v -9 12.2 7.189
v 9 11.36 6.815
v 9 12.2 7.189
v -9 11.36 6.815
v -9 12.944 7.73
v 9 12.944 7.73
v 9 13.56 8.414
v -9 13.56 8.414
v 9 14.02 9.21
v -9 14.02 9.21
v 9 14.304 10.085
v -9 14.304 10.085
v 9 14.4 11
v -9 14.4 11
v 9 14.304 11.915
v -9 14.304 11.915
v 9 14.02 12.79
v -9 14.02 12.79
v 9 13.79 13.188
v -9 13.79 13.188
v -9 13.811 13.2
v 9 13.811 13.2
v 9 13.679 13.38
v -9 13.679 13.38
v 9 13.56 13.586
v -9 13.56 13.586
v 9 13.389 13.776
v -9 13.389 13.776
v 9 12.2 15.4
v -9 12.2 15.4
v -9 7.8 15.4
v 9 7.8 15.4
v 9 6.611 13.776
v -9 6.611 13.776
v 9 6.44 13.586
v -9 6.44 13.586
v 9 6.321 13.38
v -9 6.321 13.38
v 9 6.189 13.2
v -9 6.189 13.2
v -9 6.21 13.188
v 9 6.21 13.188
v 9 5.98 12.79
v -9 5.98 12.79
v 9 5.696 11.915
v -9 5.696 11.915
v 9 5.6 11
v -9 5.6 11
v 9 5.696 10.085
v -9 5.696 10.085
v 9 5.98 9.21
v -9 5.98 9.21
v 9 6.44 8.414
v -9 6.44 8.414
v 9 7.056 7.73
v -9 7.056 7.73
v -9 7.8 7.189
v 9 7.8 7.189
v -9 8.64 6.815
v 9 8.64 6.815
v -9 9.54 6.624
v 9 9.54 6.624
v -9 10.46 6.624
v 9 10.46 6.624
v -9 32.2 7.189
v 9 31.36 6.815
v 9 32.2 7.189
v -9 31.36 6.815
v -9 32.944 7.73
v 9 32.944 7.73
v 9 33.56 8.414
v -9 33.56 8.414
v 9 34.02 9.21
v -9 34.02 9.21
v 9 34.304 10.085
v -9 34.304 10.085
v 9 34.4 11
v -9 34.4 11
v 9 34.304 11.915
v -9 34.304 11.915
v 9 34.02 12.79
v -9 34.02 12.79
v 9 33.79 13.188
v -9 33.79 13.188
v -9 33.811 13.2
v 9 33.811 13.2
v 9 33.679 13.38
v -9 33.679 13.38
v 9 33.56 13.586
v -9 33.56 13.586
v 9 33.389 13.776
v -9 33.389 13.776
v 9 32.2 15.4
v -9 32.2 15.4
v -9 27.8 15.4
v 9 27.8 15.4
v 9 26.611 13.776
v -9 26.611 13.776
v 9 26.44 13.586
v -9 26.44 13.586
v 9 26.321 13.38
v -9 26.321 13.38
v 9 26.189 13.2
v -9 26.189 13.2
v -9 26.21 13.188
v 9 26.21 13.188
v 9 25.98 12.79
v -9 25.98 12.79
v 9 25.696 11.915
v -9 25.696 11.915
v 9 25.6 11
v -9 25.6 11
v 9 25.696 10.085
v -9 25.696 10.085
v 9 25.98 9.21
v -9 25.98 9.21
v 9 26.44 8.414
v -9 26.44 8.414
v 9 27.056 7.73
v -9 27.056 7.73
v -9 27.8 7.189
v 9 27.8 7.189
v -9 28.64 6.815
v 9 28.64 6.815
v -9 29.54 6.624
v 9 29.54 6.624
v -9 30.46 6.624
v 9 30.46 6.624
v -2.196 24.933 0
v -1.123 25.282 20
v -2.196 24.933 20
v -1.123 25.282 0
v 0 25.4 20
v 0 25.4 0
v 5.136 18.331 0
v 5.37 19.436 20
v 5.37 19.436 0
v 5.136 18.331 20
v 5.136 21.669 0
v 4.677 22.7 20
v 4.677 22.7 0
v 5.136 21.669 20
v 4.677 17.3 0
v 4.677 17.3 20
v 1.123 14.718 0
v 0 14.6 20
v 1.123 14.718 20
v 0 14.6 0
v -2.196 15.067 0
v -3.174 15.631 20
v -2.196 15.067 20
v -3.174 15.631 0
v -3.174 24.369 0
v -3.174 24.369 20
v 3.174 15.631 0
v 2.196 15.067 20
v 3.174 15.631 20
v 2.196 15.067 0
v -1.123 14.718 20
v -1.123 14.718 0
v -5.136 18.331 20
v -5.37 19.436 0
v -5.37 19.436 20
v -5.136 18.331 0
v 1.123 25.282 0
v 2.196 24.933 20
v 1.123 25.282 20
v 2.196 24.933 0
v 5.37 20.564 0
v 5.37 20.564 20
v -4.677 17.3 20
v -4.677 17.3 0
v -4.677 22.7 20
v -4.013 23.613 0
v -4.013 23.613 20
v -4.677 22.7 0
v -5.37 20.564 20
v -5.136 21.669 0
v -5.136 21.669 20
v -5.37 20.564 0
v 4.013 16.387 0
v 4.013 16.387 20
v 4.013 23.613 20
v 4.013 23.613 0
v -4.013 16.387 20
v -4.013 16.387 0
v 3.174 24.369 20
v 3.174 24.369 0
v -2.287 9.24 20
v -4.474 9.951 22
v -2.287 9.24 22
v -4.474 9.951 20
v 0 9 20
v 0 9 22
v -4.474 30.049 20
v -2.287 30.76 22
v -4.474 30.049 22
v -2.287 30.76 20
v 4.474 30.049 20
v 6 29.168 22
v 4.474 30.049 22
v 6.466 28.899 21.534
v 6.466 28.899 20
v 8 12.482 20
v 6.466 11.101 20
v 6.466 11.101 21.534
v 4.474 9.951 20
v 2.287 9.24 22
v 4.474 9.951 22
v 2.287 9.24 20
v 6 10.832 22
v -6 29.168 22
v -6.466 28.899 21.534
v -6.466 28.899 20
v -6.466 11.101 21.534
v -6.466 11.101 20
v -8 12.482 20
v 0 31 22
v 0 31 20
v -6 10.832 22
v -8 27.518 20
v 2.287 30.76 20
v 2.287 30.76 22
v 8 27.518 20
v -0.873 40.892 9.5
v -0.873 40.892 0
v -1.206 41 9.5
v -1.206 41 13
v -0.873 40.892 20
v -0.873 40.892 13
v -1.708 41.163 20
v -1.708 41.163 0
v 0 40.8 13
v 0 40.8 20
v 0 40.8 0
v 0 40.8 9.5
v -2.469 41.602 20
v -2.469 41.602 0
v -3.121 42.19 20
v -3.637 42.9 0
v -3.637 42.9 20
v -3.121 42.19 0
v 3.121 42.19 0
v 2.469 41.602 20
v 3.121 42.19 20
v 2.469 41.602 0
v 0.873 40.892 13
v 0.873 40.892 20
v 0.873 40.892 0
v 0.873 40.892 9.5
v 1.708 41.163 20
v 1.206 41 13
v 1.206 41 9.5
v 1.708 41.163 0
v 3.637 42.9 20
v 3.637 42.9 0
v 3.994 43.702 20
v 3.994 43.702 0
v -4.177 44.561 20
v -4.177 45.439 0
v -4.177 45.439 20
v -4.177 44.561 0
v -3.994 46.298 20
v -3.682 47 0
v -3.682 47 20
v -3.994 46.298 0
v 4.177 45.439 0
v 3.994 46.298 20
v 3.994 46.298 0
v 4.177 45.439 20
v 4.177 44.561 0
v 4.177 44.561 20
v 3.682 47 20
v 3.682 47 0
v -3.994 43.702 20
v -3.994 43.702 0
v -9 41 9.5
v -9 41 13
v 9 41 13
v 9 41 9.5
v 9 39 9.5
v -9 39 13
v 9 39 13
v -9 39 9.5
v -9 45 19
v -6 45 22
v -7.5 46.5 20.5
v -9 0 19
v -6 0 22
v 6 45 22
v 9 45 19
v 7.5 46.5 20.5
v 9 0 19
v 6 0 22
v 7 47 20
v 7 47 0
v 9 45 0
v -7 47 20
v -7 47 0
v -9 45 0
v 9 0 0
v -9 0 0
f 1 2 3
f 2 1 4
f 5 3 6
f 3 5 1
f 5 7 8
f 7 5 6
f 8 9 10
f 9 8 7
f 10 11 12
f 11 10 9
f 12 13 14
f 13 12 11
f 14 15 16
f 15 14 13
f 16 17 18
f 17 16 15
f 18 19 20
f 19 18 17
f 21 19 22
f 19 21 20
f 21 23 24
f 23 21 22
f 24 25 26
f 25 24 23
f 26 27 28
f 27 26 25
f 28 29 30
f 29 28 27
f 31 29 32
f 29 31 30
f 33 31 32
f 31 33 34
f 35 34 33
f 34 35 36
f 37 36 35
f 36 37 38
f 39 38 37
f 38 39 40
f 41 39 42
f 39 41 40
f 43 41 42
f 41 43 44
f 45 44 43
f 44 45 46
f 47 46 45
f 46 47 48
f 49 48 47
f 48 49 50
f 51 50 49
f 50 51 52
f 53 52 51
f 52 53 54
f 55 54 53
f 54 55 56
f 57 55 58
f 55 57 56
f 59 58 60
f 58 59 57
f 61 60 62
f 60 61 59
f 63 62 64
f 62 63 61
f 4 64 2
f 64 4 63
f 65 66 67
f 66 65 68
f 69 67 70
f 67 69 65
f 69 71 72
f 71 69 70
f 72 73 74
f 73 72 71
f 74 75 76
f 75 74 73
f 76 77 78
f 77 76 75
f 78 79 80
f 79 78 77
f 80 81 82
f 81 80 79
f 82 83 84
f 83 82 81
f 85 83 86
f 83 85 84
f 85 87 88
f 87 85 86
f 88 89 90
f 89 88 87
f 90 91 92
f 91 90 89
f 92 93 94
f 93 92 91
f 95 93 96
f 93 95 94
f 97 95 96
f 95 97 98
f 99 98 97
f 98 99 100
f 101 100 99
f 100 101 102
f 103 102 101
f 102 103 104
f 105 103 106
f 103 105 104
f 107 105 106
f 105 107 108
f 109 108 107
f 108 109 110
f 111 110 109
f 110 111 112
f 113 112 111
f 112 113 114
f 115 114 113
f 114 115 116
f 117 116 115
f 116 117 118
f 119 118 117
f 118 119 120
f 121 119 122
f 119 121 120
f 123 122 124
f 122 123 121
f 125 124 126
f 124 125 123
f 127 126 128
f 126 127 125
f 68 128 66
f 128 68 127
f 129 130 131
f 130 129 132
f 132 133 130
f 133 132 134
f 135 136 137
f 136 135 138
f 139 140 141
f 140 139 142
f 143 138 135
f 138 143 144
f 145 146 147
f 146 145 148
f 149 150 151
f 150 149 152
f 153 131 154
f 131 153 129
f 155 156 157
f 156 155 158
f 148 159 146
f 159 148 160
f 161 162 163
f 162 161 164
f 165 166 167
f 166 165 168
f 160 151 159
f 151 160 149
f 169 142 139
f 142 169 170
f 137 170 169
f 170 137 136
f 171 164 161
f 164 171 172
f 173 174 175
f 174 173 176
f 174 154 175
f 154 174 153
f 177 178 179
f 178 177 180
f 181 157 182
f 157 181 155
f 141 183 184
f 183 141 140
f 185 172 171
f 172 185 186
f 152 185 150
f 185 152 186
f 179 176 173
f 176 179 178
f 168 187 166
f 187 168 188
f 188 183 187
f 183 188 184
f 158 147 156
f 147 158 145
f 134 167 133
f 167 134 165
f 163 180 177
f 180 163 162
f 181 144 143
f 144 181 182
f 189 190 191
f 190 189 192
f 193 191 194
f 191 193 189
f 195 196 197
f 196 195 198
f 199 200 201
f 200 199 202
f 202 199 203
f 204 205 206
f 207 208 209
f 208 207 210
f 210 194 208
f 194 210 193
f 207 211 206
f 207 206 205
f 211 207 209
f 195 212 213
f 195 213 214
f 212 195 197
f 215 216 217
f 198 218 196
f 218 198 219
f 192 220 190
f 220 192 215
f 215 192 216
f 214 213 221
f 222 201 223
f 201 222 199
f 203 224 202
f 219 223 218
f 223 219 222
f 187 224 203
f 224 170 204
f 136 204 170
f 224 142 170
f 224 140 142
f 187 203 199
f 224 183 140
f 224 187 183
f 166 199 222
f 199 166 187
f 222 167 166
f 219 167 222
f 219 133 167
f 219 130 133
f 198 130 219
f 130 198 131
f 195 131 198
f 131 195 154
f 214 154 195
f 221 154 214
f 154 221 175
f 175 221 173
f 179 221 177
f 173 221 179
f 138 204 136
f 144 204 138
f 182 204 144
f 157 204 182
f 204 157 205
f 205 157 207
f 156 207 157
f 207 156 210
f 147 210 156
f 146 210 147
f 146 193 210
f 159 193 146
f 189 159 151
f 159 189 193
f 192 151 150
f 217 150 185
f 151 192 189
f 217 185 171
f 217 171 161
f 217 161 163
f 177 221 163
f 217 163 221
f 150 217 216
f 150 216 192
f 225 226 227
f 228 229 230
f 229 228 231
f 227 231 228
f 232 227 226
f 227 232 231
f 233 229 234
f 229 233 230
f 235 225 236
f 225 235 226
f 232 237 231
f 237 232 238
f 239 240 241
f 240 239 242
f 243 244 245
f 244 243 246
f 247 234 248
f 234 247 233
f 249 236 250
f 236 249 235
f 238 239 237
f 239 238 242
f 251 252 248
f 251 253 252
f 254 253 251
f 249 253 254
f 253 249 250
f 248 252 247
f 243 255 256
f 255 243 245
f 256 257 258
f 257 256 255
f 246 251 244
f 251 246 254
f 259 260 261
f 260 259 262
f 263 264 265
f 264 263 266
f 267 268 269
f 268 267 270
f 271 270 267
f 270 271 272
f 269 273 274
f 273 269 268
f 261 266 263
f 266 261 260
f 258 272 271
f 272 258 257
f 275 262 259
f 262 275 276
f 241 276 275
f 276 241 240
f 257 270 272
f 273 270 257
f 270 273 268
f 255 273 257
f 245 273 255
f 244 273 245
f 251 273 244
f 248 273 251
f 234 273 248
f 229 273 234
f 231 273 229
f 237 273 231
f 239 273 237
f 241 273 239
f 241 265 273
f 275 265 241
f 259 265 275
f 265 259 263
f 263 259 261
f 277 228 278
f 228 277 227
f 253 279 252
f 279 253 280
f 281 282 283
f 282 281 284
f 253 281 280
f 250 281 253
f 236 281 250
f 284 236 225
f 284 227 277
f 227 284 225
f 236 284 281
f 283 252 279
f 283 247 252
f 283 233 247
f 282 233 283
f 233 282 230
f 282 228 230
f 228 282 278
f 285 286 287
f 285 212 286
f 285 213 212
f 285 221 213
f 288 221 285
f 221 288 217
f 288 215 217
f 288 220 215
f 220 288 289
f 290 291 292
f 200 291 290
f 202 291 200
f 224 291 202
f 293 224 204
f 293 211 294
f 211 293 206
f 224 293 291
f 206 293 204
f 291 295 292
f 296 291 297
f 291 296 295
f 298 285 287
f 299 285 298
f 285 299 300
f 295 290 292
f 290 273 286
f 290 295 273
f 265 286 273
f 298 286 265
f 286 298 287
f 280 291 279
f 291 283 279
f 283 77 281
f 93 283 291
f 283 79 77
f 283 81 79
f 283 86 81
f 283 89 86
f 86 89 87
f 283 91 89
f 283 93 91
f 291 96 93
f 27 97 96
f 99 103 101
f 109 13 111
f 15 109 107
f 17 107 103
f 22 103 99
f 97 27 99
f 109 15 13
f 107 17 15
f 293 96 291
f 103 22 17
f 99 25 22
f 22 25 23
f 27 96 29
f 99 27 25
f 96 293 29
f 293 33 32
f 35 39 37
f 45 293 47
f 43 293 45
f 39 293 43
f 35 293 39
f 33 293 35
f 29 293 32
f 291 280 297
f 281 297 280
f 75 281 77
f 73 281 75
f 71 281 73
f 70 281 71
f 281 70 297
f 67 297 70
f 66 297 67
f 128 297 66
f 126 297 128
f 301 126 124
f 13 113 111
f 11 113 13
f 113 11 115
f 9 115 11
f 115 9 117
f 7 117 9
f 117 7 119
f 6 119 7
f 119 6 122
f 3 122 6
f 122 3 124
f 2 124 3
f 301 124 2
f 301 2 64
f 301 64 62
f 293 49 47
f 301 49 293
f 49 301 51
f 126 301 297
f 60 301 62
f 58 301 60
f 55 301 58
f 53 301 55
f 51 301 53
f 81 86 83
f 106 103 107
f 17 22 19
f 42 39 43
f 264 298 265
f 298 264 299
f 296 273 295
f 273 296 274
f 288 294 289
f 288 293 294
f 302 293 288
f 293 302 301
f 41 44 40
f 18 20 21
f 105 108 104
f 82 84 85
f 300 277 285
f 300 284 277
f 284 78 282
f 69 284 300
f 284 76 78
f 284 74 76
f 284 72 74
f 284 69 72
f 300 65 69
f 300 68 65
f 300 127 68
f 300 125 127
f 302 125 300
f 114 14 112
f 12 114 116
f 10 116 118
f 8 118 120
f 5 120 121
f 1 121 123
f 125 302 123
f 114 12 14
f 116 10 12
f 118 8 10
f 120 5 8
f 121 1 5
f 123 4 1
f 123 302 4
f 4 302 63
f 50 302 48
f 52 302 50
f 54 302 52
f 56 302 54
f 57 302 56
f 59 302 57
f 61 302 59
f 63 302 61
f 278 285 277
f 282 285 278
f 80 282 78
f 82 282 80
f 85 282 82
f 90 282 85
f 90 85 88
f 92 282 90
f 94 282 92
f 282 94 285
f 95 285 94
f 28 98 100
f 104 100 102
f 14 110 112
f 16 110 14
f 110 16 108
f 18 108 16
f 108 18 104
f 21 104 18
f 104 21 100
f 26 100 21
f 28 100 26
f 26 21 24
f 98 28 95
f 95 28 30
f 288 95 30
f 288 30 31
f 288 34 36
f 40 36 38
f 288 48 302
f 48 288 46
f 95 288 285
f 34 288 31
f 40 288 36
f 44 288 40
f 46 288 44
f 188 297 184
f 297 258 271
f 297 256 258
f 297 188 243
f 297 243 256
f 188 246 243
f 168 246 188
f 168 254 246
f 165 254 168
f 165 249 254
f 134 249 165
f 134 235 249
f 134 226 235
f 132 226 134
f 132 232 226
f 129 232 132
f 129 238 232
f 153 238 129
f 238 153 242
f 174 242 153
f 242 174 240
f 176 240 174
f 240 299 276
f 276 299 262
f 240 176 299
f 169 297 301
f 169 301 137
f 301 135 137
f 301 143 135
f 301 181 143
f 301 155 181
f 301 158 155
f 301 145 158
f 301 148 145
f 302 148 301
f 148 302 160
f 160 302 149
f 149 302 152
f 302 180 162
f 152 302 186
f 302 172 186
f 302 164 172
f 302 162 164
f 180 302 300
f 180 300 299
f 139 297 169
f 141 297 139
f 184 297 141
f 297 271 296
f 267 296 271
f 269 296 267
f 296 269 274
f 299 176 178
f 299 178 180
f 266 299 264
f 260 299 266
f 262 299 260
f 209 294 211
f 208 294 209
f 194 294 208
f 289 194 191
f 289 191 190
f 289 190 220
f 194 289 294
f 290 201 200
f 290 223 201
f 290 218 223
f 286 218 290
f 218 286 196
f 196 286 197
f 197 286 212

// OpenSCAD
// PRUSA iteration3
// Y frame corners
// GNU GPL v3
// Josef Průša <iam@josefprusa.cz> and contributors
// http://www.reprap.org/wiki/Prusa_Mendel
// http://prusamendel.org


module corner_base(){	
 translate([-9,-11,0])cube([18,22,47]);
}

module corner_holes(){
 translate([-11,-11,0]){
  // Bottom hole
translate([1,11,10]) rotate([90,0,0]) teardrop(r=4.4,h=20,$fn=30);
  // Top hole
translate([1,11,30]) rotate([90,0,0]) teardrop(r=4.4,h=20,$fn=30);
  // Middle hole
  translate([11,0,20]) rotate([0,0,90]) rotate([0,90,0]) translate([0,0,-5]) cylinder(h = 270, r=5.4, $fn=30);

  // Washer hole
  translate([11,-3,20]) rotate([0,0,90]) rotate([0,90,0]) translate([0,0,-5]) cylinder(h = 10, r=11, $fn=30);

  // Top smooth rod insert
  // Smooth rod place
  translate([11,2,45]) rotate([0,90,90]) cylinder(h = 270, r=4.2, $fn=30); 
  // Ziptie
  translate([-5,9,39])  cube([30,3.5,2]);
 }
}

module corner_fancy(){
 // Side corner cutouts
  translate([-8,-9,0]) rotate([0,0,-45-180]) translate([-15,0,-1]) cube([30,30,51]);
  translate([8,-9,0]) rotate([0,0,45-180]) translate([-15,0,-1]) cube([30,30,51]);
 // Top corner cutouts
  translate([7,0,49-2]) rotate([0,45,0]) translate([-15,-15,0]) cube([30,30,30]);
  translate([-7,0,49-2]) rotate([0,-45,0]) translate([-15,-15,0]) cube([30,30,30]);
  rotate([0,0,90]){
   translate([-9,0,49-2]) rotate([0,-45,0]) translate([-15,-15,0]) cube([30,30,30]);
  }
}

module teardrop (r=8,h=20)
{
rotate([-270,0,90])
linear_extrude(height=h)
{
circle(r=r);
polygon(points=[[0,0],[r*cos(30),r*sin(30)],[0.5*r,r],[-0.5*r,r],[-r*cos(30),r*sin(30)]],
paths=[[0,1,2,3,4]]);
}
}


// Final part
module corner(){
 // Rotate the part for better printing
 translate([0,0,11]) rotate([-90,0,0]) difference(){
  corner_base();
  corner_holes();
  corner_fancy();
 }
}

corner();
